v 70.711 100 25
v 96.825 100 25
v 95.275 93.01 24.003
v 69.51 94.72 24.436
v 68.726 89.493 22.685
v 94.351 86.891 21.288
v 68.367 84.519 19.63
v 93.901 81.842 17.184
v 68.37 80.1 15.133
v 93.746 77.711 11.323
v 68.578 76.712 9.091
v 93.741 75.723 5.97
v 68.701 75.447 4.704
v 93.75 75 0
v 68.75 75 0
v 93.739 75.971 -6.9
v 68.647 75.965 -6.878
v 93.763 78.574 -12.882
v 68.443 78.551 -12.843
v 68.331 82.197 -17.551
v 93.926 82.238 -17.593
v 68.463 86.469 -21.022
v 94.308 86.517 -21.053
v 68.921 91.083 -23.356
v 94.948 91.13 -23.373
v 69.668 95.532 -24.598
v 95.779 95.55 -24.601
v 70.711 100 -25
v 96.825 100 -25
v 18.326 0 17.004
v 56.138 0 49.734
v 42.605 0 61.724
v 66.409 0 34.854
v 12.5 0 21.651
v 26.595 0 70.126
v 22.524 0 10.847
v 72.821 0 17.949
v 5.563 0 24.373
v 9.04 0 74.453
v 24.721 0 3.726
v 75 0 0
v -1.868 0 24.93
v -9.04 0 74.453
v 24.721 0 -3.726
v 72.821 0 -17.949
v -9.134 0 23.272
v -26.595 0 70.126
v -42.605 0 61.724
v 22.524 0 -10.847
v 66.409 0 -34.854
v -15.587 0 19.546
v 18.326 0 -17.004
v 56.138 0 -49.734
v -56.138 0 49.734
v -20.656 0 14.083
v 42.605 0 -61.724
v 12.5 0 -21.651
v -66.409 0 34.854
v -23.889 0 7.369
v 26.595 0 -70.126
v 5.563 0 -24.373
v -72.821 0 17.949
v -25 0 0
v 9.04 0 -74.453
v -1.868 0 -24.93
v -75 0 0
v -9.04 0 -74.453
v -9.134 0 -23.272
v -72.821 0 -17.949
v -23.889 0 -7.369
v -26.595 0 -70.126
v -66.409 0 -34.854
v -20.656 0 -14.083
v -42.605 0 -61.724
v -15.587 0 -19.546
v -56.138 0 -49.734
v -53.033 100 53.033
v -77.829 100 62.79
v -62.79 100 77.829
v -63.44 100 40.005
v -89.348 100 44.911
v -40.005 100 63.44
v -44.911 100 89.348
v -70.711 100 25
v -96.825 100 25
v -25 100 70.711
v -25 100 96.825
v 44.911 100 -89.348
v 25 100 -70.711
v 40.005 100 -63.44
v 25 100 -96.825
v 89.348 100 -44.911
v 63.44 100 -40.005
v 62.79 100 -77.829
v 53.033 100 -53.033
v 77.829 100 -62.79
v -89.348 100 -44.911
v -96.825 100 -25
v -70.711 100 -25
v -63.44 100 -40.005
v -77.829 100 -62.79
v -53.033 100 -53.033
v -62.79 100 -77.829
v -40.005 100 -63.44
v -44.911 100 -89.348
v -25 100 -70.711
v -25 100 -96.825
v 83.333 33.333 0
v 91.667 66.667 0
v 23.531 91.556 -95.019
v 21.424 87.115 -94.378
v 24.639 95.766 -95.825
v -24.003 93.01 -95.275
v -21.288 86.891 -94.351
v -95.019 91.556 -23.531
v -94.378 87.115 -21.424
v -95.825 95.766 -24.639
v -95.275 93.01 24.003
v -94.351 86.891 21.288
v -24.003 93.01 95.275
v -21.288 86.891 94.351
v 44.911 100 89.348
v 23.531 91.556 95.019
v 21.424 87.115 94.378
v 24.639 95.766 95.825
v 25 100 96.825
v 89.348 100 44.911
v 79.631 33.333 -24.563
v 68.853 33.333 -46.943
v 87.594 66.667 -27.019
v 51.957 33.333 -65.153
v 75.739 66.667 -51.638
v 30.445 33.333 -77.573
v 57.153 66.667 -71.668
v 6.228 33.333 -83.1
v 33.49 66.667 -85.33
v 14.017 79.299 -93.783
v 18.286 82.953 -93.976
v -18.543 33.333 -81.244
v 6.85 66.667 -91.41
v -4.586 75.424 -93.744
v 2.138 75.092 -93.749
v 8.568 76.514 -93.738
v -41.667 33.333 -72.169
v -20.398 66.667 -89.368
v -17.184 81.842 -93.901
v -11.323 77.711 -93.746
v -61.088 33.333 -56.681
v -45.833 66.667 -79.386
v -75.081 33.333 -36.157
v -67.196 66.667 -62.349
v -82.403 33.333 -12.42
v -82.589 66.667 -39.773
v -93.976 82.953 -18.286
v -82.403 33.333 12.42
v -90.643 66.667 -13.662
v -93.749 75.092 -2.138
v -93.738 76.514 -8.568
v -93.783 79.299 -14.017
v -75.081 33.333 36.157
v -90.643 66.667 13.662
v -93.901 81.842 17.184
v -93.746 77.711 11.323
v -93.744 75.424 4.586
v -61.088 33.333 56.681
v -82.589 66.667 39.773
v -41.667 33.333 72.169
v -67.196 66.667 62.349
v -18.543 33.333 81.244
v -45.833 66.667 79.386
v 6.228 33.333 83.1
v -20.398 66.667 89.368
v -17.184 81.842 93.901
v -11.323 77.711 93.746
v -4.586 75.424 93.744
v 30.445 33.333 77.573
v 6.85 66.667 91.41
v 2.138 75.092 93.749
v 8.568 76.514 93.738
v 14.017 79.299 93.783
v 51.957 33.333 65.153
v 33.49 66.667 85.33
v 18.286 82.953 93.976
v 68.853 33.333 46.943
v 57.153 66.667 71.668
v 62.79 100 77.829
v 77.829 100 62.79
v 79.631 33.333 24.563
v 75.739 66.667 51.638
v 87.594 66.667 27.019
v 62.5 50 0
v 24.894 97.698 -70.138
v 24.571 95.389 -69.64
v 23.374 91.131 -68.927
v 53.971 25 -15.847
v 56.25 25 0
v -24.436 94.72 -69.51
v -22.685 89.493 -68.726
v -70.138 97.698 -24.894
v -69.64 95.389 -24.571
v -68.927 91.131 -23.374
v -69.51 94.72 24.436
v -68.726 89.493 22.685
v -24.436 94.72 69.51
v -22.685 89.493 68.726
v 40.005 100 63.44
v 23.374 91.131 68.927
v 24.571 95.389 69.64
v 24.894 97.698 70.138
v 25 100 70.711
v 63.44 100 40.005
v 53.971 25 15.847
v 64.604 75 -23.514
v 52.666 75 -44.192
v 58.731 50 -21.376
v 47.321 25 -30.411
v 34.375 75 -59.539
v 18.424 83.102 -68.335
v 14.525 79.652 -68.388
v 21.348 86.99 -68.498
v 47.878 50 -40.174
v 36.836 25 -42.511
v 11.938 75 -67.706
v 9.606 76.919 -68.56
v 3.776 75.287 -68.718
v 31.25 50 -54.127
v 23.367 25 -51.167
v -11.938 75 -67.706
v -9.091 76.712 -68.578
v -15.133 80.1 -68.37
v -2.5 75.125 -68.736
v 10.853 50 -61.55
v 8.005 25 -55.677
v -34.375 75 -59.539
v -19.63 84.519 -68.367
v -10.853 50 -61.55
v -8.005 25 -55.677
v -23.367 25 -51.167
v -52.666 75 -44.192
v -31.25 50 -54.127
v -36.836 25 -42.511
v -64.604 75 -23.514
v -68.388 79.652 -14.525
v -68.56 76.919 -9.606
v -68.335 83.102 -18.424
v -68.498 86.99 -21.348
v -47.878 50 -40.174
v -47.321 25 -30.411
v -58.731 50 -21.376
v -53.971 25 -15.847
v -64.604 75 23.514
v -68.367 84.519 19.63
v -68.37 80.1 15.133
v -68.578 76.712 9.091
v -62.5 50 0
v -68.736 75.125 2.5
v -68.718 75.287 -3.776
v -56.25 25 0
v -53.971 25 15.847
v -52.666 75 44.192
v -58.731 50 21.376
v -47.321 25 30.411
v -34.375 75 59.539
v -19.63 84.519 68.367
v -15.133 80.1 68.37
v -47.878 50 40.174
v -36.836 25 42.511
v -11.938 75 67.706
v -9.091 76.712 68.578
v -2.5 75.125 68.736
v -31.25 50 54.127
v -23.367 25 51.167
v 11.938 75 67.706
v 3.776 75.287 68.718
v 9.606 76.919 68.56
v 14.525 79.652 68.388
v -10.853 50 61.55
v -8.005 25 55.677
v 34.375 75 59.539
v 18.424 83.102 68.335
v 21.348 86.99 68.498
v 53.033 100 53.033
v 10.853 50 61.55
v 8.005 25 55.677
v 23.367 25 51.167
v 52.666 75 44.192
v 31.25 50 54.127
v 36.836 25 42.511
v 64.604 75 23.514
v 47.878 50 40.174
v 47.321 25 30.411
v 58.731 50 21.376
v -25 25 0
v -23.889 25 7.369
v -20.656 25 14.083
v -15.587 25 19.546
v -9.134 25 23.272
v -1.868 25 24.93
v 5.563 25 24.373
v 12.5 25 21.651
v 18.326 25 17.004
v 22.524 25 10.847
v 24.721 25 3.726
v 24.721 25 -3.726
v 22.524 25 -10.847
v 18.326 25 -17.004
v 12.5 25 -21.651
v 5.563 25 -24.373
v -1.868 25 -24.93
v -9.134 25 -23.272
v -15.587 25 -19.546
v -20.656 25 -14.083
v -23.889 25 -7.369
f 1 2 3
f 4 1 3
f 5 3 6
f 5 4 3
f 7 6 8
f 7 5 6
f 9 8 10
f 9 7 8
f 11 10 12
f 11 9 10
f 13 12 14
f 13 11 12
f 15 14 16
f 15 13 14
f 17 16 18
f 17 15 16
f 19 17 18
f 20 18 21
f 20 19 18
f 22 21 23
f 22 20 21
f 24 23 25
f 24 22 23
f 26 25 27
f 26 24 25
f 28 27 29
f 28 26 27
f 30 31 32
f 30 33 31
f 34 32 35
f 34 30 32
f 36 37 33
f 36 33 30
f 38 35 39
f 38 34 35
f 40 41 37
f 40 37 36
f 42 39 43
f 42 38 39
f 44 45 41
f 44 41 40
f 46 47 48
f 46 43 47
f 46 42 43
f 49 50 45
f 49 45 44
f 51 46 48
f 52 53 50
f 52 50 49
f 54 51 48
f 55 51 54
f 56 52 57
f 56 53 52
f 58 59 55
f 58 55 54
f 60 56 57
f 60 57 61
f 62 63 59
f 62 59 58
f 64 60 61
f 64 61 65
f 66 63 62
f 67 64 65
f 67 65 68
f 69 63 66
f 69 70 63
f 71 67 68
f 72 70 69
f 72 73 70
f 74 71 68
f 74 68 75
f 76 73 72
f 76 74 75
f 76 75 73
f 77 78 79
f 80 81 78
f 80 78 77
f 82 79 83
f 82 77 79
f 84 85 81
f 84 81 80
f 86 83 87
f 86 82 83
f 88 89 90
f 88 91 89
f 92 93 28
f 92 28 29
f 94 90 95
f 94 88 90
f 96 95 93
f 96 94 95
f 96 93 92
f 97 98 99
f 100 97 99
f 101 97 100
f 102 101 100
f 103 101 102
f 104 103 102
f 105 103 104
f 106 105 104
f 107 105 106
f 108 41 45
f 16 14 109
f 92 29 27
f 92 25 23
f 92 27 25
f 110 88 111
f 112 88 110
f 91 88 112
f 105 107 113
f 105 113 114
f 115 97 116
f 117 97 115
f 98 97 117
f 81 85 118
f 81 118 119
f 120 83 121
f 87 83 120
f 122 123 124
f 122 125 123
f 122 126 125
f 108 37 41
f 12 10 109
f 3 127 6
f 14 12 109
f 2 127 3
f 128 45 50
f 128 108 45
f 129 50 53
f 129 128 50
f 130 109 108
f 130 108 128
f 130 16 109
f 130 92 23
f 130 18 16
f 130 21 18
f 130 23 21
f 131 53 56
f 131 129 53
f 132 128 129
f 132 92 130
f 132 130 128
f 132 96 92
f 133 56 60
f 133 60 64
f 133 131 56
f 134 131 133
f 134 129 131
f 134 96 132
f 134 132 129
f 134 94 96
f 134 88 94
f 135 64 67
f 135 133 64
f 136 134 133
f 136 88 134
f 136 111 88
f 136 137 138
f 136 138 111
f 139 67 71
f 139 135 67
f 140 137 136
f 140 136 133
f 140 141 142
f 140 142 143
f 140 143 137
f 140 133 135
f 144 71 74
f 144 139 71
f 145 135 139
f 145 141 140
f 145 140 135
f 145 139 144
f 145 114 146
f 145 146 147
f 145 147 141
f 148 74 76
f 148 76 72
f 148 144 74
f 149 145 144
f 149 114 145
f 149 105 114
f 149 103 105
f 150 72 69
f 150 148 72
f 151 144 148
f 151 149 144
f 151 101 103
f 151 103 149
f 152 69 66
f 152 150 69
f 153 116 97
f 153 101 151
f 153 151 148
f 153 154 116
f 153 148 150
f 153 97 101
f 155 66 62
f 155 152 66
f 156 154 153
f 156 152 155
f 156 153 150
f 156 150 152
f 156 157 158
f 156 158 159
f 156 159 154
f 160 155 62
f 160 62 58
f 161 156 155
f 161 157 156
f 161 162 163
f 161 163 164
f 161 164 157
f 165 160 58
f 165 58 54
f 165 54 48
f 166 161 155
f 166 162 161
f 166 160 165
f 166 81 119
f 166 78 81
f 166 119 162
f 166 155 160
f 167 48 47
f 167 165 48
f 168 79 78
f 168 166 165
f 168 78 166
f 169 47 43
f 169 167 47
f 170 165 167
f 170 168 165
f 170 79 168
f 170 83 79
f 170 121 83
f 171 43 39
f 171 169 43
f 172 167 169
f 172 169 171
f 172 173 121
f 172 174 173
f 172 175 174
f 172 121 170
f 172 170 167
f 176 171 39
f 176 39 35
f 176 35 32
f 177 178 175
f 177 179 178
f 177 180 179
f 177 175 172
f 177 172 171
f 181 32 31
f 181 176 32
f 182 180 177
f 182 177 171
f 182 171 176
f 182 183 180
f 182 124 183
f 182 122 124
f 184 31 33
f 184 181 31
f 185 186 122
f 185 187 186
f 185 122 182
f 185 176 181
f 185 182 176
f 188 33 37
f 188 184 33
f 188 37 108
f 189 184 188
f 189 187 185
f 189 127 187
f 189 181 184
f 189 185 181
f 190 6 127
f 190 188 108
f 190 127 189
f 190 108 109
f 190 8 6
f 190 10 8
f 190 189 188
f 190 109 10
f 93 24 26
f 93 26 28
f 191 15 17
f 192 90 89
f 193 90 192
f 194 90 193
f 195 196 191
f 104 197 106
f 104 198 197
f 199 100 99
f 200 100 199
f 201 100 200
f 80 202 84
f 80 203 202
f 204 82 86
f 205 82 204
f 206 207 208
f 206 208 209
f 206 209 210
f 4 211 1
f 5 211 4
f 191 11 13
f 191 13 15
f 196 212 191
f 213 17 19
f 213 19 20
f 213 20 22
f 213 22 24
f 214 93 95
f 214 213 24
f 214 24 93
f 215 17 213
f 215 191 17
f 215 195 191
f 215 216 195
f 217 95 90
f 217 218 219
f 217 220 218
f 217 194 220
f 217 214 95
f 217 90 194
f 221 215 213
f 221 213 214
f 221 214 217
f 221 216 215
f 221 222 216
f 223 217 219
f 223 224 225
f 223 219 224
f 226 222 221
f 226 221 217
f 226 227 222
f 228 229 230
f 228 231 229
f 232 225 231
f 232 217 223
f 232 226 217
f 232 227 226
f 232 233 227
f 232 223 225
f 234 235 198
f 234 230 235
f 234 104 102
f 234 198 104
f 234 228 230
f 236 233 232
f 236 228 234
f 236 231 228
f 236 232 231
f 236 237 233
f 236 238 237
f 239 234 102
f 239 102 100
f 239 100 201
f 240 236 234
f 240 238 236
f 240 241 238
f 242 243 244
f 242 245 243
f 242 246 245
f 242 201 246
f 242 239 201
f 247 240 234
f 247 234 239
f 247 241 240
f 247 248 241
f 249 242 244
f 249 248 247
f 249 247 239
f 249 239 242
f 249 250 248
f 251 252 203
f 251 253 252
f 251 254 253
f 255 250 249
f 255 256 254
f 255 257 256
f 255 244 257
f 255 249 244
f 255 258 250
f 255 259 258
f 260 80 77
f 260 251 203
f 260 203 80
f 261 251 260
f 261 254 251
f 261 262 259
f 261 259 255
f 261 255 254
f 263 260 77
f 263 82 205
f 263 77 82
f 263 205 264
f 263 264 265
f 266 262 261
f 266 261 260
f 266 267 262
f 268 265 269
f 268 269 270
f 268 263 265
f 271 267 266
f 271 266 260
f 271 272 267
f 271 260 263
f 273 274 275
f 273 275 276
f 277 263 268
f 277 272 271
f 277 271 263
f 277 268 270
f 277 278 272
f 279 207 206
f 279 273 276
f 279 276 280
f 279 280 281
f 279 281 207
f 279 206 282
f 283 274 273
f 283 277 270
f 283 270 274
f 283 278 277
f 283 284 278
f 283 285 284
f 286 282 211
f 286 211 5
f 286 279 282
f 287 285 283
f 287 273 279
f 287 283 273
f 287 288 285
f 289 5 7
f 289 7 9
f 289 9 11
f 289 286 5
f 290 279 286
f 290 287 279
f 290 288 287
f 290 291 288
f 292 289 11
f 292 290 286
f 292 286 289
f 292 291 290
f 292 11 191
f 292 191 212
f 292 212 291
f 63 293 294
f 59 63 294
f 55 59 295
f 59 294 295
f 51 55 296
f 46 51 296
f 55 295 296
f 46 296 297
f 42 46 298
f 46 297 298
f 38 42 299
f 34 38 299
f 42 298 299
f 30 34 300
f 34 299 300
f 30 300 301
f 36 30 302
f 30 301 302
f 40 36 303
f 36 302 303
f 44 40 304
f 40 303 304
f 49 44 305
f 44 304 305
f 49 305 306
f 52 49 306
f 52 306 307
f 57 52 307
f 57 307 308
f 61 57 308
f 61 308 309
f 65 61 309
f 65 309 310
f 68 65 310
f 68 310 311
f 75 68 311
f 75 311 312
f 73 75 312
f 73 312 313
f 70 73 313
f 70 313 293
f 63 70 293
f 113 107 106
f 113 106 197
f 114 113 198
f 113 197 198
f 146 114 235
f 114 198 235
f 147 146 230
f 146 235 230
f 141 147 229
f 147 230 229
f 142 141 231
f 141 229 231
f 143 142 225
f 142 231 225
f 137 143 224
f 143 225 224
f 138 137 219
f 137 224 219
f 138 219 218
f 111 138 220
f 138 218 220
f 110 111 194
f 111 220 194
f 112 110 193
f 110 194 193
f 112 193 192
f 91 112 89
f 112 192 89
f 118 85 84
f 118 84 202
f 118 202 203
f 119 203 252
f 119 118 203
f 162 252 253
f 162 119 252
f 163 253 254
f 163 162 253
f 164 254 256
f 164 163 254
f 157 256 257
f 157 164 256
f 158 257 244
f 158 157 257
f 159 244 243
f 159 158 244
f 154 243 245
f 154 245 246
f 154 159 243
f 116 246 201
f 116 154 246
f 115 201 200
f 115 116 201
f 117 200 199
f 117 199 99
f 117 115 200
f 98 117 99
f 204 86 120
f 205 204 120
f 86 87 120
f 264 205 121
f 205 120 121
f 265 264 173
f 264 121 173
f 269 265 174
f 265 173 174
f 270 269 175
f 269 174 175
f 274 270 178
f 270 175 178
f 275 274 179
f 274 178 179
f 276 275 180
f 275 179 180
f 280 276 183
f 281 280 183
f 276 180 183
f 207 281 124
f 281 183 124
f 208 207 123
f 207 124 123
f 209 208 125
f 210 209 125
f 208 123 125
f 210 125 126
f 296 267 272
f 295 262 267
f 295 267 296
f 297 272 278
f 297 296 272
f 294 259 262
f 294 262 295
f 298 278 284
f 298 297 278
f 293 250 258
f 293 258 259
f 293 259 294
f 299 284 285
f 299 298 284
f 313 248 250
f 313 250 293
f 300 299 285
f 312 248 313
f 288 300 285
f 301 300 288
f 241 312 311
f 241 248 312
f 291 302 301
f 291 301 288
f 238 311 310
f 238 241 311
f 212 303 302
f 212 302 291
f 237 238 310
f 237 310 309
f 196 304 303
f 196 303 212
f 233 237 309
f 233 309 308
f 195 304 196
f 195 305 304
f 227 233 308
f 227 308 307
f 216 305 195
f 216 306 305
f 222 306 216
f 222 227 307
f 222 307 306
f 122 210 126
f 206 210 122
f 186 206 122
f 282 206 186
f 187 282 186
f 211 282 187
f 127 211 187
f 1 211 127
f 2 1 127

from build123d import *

# Parameters (mm, degrees)
SKETCH2_R               = 25
CUT_EXTRUDE2_DEPTH      = 30
CUT_EXTRUDE3_DEPTH      = 174.205080757
CUT_EXTRUDE3_DEPTH_BACK = 174.205080757
SKETCH3_R               = 25
SKETCH4_R               = 25
CUT_EXTRUDE4_DEPTH      = 100


with BuildPart() as part:
    # Sketch1 → Revolve1 (revolve)
    with BuildSketch(Plane.XY):
        Polygon((0, 0), (75, 0), (100, 100), (75, 100), (56.25, 25), (0, 25), align=None)
    revolve(axis=Axis((0, 0, 0), (0, 1, 0)))

    # Sketch2 → Cut-Extrude2 (cut)
    with BuildSketch(Plane(origin=(0, 25, 0), x_dir=(1, 0, 0), z_dir=(0, 1, 0))):
        with Locations(Location((0, 0, 0), (0, 0, 180))):
            Circle(SKETCH2_R)
    extrude(amount=-CUT_EXTRUDE2_DEPTH, mode=Mode.SUBTRACT)

    # Sketch3 → Cut-Extrude3 (cut, two sides: drawn at the far end of the back side and taken through both)
    with BuildSketch(Plane(origin=(0, 0, 0), x_dir=(0, 0, -1), z_dir=(1, 0, 0)).offset(-CUT_EXTRUDE3_DEPTH_BACK)):
        with Locations((0, 100)):
            Circle(SKETCH3_R)
    extrude(amount=CUT_EXTRUDE3_DEPTH + CUT_EXTRUDE3_DEPTH_BACK, mode=Mode.SUBTRACT)

    # Sketch4 → Cut-Extrude4 (cut, symmetric)
    with BuildSketch(Plane.XY):
        with Locations((0, 100)):
            Circle(SKETCH4_R)
    extrude(amount=CUT_EXTRUDE4_DEPTH, both=True, mode=Mode.SUBTRACT)


solid = part.part
